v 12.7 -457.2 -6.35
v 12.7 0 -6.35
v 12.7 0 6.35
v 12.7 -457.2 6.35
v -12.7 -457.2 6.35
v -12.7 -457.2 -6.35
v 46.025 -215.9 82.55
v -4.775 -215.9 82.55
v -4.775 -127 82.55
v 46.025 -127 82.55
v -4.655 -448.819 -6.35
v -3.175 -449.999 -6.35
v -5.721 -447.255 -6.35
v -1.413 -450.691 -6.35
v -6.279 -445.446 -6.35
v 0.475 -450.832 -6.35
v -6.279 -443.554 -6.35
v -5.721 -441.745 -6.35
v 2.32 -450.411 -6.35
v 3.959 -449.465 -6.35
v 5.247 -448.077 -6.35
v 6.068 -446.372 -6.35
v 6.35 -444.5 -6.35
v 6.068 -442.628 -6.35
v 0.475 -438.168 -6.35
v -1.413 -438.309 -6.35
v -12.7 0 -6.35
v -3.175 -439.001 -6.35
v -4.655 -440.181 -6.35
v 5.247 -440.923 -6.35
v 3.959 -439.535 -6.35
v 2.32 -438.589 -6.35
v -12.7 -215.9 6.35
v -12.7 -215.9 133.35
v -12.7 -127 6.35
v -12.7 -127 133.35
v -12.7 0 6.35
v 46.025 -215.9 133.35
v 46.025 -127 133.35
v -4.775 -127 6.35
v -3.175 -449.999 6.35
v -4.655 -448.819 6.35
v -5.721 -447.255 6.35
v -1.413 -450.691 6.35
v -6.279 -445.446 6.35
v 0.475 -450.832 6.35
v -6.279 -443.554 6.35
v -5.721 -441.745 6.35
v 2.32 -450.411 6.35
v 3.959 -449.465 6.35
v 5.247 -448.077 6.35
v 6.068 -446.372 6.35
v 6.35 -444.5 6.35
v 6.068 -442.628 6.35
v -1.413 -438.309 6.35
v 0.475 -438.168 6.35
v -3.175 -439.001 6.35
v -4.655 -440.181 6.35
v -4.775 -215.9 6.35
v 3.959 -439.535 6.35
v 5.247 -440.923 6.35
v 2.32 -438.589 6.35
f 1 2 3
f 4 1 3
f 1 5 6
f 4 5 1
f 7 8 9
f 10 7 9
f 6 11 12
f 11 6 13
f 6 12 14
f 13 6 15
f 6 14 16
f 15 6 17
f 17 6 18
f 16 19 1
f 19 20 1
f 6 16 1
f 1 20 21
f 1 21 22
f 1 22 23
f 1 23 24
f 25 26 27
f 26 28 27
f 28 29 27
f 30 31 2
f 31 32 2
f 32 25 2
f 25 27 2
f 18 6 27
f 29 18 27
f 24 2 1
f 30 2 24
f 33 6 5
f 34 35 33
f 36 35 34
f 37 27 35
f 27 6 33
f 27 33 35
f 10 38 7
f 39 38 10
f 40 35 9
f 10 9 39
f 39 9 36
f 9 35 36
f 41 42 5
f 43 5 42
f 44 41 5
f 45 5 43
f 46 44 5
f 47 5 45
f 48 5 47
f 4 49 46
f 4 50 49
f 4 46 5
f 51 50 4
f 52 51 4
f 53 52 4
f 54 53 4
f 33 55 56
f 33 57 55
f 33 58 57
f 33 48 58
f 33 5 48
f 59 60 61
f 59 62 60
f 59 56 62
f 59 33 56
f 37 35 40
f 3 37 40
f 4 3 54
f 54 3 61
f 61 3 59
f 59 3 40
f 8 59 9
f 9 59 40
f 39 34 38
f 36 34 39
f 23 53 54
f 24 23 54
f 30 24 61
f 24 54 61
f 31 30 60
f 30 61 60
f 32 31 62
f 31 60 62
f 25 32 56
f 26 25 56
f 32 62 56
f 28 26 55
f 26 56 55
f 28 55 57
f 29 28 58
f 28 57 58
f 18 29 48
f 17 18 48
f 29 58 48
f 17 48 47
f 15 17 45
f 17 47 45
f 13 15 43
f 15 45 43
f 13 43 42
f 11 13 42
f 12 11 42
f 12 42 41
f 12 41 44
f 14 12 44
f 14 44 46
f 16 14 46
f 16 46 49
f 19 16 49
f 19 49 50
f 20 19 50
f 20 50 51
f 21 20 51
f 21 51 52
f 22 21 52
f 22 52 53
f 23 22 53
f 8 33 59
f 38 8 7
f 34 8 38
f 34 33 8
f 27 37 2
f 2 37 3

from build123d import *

# Parameters (mm, degrees)
F0_W     = 25.4
F0_H     = 12.7
F1_DEPTH = 457.2
F2_W     = 7.9248
F2_H     = 88.9
F3_DEPTH = 127
F4_W     = 88.9
F4_H     = 50.8
F5_DEPTH = 50.8
F6_R     = 6.35
F7_DEPTH = 25.4


with BuildPart() as f1:
    # F0 (on Front) → F1 (new body)
    with BuildSketch(Plane.XZ):
        Rectangle(F0_W, F0_H)
    extrude(amount=F1_DEPTH)

    # F2 (on face) → F3 (join)
    with BuildSketch(Plane.XY.offset(6.35)):
        with Locations((-8.7376, -171.45)):
            Rectangle(F2_W, F2_H)
    extrude(amount=F3_DEPTH)

    # F4 (on face) → F5 (join)
    with BuildSketch(Plane.YZ.offset(-4.7752)):
        with Locations((-171.45, 107.95)):
            Rectangle(F4_W, F4_H)
    extrude(amount=F5_DEPTH)

    # F6 (on face) → F7 (cut)
    with BuildSketch(Plane.XY.offset(6.35)):
        with Locations((0, -444.5)):
            Circle(F6_R)
    extrude(amount=-F7_DEPTH, mode=Mode.SUBTRACT)


solid = f1.part
